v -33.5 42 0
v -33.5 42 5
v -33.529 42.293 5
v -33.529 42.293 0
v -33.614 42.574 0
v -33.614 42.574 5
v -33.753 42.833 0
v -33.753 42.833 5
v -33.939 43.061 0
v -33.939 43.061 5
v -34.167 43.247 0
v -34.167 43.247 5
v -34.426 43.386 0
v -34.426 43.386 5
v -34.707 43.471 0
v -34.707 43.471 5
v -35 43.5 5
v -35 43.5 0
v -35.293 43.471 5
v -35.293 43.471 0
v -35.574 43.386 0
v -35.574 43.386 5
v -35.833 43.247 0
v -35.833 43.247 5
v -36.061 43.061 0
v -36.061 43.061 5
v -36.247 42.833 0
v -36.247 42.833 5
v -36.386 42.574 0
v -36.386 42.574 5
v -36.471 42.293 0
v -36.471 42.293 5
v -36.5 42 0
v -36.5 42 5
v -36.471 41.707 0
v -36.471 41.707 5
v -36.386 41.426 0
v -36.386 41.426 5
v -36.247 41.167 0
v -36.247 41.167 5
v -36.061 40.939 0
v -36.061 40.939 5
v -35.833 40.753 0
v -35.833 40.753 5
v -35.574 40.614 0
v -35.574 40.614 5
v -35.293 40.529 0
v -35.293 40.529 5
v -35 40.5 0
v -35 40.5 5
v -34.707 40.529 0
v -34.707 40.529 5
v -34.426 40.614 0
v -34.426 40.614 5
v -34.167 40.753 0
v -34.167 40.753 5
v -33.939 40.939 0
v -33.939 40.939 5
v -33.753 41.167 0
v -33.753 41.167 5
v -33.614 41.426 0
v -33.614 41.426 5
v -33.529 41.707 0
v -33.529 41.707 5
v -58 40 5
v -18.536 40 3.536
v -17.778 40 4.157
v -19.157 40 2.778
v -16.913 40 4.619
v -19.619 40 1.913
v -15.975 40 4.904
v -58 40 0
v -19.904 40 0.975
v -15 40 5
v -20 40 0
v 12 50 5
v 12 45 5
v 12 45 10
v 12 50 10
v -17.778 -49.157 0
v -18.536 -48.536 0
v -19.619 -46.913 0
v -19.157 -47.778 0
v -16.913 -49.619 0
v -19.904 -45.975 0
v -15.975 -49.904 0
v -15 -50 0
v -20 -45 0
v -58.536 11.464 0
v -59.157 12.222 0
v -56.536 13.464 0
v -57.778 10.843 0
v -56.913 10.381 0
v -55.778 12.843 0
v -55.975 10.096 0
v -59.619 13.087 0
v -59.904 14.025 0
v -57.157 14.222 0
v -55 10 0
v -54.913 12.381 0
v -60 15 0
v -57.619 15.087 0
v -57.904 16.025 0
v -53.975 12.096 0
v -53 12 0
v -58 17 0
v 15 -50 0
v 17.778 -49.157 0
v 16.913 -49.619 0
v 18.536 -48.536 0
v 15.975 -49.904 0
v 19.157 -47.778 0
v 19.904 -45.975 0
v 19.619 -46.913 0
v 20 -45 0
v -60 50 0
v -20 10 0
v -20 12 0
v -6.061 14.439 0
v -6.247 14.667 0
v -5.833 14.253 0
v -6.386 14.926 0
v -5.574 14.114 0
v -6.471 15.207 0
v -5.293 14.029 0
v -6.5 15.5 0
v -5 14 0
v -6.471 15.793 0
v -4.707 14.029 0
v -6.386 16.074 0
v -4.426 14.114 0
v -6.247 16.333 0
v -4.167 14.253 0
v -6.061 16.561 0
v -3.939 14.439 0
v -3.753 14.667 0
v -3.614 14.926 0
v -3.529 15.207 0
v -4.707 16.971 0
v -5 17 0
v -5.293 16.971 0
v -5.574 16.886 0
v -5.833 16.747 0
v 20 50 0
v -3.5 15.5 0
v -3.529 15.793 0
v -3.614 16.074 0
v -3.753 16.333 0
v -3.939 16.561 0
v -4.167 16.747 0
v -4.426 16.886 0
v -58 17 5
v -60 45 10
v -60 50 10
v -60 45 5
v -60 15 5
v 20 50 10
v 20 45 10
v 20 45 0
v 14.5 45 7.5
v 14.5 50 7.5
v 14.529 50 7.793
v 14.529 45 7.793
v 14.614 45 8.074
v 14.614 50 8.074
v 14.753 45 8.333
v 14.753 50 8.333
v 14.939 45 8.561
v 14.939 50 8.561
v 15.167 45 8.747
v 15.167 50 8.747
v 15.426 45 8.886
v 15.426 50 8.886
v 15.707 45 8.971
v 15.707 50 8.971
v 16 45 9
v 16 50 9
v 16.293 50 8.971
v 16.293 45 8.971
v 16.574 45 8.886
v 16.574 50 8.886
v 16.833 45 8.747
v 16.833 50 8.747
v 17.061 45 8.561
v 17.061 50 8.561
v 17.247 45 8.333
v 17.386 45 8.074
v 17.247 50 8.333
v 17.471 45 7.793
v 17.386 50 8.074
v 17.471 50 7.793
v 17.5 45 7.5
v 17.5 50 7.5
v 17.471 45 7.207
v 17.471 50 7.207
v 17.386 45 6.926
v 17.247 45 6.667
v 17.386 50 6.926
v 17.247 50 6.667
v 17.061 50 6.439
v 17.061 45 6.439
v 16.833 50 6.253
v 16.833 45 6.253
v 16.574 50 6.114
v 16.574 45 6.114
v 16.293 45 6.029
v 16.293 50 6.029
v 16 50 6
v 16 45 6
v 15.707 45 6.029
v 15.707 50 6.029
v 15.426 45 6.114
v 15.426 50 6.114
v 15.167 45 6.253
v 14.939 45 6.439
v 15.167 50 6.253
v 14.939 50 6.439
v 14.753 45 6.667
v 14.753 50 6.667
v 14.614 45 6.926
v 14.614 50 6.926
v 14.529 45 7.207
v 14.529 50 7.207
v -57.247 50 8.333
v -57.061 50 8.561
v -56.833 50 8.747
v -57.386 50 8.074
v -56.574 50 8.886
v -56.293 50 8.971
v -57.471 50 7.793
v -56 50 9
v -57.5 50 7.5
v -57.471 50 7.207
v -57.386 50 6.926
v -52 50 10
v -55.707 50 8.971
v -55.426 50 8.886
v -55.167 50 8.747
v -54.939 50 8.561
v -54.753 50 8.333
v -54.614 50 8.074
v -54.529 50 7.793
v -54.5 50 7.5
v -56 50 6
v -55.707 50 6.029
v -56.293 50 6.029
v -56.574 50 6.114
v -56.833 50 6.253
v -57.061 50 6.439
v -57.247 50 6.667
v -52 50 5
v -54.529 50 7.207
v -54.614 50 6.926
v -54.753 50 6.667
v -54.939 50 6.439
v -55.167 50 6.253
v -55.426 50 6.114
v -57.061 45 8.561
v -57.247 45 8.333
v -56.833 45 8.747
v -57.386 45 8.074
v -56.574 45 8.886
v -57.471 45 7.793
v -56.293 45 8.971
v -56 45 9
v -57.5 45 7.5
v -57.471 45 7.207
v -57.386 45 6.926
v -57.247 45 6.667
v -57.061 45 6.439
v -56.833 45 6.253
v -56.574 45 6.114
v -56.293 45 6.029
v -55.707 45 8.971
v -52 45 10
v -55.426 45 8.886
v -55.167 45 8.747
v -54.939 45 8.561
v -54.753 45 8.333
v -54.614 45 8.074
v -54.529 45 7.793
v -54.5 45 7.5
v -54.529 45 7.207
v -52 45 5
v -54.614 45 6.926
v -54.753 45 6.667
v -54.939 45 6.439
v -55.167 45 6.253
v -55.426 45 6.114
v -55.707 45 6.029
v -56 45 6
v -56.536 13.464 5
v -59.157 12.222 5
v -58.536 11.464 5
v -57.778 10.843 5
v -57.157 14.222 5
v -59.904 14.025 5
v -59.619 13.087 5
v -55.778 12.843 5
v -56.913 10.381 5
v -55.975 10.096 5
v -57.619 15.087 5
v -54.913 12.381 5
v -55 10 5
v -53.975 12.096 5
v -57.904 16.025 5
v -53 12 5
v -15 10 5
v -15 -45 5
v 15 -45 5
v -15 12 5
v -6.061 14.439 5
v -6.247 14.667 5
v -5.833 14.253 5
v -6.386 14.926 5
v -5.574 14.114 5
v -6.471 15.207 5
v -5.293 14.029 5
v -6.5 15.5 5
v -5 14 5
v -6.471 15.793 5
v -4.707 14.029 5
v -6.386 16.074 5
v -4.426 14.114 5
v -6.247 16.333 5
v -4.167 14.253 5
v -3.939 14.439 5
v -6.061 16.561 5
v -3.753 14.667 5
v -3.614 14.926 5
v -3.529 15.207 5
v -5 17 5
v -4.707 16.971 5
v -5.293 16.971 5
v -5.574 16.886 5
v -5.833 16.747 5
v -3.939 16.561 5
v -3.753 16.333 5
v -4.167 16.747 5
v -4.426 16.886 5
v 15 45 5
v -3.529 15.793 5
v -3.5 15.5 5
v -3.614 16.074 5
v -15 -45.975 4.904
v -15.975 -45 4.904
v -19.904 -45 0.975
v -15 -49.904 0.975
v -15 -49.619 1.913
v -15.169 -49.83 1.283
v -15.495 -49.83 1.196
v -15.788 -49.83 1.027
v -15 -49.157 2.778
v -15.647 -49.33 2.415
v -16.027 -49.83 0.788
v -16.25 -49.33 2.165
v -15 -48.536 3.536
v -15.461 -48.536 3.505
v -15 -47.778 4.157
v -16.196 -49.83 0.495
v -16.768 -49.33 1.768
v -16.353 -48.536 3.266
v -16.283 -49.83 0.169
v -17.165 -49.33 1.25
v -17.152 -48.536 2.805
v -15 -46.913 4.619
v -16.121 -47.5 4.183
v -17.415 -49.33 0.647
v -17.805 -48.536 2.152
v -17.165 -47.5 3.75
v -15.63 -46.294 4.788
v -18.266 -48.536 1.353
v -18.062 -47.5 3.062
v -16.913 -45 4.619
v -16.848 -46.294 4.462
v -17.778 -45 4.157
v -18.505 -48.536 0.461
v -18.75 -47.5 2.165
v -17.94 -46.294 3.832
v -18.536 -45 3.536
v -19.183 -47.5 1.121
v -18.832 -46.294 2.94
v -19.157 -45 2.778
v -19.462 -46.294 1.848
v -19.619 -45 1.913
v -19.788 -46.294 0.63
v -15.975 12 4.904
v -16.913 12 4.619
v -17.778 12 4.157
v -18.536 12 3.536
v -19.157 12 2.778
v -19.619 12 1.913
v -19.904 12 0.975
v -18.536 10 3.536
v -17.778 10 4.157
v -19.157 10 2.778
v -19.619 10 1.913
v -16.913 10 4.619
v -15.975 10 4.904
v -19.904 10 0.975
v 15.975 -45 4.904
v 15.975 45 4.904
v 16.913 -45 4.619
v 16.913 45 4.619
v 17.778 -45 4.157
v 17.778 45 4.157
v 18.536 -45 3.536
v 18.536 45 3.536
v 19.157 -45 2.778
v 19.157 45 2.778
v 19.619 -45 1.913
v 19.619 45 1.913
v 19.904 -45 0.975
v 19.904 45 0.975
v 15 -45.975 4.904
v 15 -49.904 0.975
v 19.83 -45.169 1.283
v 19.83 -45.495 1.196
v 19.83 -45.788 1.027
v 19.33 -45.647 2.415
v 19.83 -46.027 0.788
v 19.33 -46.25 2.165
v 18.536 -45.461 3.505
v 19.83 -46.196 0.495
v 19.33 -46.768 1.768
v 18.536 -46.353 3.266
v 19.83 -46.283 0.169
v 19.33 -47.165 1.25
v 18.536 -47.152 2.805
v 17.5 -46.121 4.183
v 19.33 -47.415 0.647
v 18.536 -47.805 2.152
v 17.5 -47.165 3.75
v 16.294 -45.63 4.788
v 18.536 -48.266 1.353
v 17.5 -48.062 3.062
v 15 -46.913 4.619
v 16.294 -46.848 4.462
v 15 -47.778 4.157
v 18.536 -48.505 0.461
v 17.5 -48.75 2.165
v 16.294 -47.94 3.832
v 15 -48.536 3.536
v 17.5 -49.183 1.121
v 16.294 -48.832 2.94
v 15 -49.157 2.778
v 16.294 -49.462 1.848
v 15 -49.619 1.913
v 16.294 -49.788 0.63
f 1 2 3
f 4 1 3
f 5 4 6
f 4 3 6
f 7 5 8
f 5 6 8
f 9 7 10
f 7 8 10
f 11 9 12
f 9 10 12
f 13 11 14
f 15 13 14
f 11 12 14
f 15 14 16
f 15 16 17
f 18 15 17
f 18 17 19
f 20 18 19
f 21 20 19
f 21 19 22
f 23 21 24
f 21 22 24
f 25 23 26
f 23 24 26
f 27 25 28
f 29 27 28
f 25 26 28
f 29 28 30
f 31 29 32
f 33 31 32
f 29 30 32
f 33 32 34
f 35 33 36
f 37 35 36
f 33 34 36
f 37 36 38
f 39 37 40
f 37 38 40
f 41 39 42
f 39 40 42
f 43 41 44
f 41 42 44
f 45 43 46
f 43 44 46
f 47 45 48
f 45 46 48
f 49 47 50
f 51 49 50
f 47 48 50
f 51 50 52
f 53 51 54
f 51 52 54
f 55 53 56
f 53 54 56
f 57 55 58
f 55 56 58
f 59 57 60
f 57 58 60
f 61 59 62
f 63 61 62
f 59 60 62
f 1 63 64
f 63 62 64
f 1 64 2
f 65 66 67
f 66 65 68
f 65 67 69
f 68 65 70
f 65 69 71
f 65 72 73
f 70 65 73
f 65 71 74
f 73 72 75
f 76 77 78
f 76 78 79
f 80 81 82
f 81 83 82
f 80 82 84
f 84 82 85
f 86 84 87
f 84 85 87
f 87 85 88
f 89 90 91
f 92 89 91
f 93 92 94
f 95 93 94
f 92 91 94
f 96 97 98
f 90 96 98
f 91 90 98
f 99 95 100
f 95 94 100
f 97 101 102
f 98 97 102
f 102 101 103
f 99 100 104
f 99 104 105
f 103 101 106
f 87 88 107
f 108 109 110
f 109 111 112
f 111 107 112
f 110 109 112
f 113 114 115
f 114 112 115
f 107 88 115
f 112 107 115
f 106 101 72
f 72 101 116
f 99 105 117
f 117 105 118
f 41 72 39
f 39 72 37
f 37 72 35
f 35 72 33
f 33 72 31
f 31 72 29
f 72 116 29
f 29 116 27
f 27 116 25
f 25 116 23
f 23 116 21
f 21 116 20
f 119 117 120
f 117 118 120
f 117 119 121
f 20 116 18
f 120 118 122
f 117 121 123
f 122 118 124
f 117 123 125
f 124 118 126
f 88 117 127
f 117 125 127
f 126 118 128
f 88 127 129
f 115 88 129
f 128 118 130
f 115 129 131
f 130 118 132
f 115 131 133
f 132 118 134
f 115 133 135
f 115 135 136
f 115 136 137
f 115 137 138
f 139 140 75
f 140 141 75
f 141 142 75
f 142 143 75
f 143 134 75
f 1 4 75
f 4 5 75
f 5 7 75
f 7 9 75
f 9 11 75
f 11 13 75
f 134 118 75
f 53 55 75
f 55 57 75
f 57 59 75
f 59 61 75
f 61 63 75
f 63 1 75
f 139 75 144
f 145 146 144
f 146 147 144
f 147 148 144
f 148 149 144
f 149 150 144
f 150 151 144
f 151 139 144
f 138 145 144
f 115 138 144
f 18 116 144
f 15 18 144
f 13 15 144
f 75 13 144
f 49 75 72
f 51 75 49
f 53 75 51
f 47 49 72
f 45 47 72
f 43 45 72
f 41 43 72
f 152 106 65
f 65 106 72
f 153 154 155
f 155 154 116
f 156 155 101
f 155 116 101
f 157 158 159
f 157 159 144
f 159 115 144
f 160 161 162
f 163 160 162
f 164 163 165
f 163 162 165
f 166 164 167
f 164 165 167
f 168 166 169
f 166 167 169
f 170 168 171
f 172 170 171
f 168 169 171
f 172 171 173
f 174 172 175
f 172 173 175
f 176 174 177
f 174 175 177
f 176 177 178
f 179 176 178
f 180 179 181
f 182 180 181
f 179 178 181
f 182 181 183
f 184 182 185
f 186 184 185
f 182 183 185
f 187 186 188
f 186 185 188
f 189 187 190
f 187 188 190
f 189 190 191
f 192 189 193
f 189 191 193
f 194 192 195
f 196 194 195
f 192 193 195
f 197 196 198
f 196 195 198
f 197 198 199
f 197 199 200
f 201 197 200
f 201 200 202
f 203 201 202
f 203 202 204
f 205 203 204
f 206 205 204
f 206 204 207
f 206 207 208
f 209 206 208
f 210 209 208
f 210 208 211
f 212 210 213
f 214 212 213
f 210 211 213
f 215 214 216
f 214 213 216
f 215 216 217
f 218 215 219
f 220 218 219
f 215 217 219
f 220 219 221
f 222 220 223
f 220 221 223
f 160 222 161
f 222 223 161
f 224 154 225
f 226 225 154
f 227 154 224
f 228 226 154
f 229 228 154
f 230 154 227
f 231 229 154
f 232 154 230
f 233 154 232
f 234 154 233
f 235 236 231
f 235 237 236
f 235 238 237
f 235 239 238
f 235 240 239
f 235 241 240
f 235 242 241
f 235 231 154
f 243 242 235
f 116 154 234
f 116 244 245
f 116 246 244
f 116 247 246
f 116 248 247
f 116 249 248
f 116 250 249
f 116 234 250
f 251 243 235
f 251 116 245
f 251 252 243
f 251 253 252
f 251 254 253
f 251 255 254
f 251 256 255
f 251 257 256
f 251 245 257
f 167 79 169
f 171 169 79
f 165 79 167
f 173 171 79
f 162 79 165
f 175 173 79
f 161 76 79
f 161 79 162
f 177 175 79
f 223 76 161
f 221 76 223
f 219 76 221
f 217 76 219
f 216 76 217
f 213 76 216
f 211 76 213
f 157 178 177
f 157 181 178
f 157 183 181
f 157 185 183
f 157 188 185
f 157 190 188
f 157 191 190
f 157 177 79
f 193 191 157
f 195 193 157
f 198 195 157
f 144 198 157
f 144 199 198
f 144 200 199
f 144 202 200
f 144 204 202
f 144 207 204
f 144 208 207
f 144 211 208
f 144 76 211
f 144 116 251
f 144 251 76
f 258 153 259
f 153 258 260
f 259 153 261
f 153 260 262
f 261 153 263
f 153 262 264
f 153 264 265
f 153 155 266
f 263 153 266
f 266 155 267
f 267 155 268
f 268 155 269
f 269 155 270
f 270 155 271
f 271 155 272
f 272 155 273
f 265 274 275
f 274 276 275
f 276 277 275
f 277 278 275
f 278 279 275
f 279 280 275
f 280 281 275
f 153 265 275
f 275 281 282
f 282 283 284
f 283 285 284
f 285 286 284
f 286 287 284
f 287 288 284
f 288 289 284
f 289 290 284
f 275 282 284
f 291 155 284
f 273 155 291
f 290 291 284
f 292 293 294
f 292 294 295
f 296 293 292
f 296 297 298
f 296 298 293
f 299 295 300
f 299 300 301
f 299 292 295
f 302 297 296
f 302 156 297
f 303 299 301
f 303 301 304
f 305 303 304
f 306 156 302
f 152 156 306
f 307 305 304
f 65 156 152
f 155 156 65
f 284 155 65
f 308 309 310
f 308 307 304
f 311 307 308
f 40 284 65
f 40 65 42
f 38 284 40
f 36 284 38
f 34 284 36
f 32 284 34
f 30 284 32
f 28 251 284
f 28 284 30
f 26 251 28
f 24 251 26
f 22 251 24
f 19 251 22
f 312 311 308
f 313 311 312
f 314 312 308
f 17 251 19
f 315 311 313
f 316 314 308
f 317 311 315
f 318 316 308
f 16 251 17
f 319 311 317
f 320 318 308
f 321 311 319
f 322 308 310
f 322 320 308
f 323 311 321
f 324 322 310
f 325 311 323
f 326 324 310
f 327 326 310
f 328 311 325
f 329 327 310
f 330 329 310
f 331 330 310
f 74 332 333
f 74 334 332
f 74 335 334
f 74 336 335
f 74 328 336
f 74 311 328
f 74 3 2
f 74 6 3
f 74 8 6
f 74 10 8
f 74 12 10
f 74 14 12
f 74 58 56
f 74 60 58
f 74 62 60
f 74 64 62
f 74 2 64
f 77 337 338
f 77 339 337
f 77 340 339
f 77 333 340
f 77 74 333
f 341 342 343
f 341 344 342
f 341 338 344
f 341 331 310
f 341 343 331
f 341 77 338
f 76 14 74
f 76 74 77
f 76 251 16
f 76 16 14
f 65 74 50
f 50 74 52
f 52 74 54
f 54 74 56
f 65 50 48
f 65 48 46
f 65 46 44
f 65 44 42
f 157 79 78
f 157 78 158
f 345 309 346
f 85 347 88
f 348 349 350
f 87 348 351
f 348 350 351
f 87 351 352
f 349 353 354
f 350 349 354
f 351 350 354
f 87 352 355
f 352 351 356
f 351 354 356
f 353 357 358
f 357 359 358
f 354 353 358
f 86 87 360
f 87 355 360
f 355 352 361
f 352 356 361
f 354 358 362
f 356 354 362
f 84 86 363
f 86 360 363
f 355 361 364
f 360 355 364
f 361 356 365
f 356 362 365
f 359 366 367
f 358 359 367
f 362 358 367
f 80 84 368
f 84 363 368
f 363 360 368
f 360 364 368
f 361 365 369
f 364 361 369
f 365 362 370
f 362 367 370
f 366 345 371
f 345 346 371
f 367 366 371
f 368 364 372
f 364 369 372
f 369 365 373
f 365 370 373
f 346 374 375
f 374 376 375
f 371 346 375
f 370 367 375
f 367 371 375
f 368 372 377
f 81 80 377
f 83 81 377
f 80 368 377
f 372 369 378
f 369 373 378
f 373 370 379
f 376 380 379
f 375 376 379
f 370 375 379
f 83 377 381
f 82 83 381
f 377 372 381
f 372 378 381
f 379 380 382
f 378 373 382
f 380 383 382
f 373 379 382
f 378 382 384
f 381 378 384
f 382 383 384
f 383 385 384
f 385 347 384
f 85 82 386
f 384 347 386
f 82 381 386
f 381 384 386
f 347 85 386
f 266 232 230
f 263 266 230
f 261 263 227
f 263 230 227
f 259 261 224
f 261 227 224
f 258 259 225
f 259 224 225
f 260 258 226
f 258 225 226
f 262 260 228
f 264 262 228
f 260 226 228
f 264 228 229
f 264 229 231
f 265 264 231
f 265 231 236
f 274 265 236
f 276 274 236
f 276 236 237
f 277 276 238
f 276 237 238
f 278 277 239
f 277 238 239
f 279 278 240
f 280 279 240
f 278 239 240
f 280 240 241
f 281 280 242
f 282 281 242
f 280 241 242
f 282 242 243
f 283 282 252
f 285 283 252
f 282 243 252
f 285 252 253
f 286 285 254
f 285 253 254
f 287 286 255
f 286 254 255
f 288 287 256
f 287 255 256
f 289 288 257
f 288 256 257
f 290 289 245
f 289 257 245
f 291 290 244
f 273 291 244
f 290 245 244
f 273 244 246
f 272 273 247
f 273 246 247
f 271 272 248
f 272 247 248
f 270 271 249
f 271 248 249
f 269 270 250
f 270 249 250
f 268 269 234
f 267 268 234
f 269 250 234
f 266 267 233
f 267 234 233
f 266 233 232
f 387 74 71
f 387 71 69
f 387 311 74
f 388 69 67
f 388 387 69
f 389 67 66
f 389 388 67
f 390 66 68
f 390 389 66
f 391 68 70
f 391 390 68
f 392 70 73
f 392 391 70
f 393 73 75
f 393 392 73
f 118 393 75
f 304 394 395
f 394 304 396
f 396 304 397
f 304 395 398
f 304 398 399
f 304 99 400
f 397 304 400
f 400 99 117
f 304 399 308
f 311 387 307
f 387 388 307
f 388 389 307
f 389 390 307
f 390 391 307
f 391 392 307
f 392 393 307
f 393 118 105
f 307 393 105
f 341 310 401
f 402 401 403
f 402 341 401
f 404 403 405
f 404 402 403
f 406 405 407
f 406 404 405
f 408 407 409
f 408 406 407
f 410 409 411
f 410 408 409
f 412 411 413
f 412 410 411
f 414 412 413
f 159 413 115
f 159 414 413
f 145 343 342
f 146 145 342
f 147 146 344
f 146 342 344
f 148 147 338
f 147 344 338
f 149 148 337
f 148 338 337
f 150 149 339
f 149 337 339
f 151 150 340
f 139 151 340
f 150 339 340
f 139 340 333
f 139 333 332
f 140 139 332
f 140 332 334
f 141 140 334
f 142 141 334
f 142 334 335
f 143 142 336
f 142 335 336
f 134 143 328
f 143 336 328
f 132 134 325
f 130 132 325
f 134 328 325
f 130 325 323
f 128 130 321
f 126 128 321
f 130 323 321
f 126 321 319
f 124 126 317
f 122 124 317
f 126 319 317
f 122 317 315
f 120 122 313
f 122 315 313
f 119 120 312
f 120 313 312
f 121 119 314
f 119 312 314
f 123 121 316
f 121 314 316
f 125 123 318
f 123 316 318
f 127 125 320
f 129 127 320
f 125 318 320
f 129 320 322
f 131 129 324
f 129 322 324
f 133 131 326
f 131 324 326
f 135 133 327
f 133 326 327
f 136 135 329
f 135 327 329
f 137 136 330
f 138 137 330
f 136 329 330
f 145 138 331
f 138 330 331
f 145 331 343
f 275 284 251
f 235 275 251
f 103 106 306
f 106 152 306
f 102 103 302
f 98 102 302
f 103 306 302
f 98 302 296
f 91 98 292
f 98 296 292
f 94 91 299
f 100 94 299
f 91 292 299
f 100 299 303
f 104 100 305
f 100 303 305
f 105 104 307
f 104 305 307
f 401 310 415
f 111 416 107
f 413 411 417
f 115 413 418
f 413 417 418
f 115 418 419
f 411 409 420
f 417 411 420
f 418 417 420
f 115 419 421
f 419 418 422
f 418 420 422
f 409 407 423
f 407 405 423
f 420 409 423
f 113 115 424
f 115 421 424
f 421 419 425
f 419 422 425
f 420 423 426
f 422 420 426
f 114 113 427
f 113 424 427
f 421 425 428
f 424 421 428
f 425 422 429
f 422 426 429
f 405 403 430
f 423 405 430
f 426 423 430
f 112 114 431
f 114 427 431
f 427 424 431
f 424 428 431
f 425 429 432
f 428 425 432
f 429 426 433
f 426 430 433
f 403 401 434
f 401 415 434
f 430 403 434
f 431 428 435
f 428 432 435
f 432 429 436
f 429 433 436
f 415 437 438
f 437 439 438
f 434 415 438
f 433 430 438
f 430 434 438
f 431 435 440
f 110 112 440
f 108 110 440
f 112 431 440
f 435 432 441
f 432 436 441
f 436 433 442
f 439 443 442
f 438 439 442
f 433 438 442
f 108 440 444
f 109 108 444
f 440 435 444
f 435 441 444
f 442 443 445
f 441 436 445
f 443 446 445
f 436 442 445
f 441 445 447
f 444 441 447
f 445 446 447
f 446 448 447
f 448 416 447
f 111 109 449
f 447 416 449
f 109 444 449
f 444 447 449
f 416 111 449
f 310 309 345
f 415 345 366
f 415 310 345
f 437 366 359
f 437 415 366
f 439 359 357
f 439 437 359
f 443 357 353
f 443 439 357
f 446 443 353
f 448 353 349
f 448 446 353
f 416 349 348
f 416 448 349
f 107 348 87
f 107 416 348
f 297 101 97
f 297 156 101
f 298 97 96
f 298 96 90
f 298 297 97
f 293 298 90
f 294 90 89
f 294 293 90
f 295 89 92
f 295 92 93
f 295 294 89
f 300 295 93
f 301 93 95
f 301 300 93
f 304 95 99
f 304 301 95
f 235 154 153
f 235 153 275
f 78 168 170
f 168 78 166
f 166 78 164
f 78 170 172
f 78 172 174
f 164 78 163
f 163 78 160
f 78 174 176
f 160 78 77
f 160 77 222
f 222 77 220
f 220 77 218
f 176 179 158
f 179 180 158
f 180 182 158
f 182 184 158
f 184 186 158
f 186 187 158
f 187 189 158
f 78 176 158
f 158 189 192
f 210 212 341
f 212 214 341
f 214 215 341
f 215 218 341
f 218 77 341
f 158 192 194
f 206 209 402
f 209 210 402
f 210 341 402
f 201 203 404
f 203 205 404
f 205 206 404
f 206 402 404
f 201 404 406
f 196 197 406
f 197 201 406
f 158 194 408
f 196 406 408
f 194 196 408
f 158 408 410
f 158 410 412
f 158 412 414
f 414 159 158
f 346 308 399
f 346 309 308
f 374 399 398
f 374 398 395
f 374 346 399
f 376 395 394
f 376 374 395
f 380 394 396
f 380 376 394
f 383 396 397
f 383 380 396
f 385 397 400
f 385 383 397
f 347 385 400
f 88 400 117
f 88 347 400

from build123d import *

# Parameters (mm, degrees)
F0_W     = 38
F0_H     = 10
F1_DEPTH = 5
F2_R     = 1.5
F3_DEPTH = 5
F4_W     = 8
F4_H     = 5
F5_DEPTH = 5
F6_R     = 1.5
F7_DEPTH = 5
F8_R     = 4.99999


# Not quite as in the source:
# - a fillet or chamfer is up to 0.001 mm smaller than in the source, because OpenCascade refuses the exact size
# - a feature names something its author has since deleted; it is built from what else it names


with BuildPart() as f1:
    # F0 (on Top) → F1 (new body)
    with BuildSketch(Plane.XY):
        Polygon((20, -50), (20, 50), (-20, 50), (-20, 40), (-20, 12), (-20, 10), (-20, -50), align=None)
        with Locations((-39, 45)):
            Rectangle(F0_W, F0_H)
        Polygon((-58, 40), (-58, 50), (-60, 50), (-60, 10), (-20, 10), (-20, 12), (-58, 12), align=None)
    extrude(amount=F1_DEPTH)

    # F2 (on face) → F3 (cut)
    with BuildSketch(Plane.XY.offset(5)):
        with Locations((-35, 42)):
            Circle(F2_R)
        with Locations((-5, 15.5)):
            Circle(F2_R)
    extrude(amount=-F3_DEPTH, mode=Mode.SUBTRACT)

    # F4 (on face) → F5 (join)
    with BuildSketch(Plane.XY.offset(5)):
        with Locations((16, 47.5)):
            Rectangle(F4_W, F4_H)
        with Locations((-56, 47.5)):
            Rectangle(F4_W, F4_H)
    extrude(amount=F5_DEPTH)

    # F6 (on face) → F7 (cut)
    with BuildSketch(Plane(origin=(0, 50, 0), x_dir=(-1, 0, 0), z_dir=(0, 1, 0))):
        with BuildLine():
            ThreePointArc((-14.5, 7.5), (-14.9393398282, 8.5606601718), (-16, 9))
            ThreePointArc((-16, 9), (-17.0606601718, 6.4393398282), (-14.5, 7.5))
        make_face()
        with Locations((56, 7.5)):
            Circle(F6_R)
    extrude(amount=-F7_DEPTH, mode=Mode.SUBTRACT)

    # F8 (radius 5 in the source; OpenCascade refuses exactly that, so slightly less here)
    f8_edges = [f1.edges().sort_by_distance(p)[0] for p in [
        (-60, 10, 2.5),
        (-58, 12, 2.5),
        (-20, -20, 5),
        (-20, 26, 5),
        (0, -50, 5),
        (20, -2.5, 5),
        (-20, -50, 2.5),
        (20, -50, 2.5),
    ]]
    fillet(f8_edges, radius=F8_R)


solid = f1.part
